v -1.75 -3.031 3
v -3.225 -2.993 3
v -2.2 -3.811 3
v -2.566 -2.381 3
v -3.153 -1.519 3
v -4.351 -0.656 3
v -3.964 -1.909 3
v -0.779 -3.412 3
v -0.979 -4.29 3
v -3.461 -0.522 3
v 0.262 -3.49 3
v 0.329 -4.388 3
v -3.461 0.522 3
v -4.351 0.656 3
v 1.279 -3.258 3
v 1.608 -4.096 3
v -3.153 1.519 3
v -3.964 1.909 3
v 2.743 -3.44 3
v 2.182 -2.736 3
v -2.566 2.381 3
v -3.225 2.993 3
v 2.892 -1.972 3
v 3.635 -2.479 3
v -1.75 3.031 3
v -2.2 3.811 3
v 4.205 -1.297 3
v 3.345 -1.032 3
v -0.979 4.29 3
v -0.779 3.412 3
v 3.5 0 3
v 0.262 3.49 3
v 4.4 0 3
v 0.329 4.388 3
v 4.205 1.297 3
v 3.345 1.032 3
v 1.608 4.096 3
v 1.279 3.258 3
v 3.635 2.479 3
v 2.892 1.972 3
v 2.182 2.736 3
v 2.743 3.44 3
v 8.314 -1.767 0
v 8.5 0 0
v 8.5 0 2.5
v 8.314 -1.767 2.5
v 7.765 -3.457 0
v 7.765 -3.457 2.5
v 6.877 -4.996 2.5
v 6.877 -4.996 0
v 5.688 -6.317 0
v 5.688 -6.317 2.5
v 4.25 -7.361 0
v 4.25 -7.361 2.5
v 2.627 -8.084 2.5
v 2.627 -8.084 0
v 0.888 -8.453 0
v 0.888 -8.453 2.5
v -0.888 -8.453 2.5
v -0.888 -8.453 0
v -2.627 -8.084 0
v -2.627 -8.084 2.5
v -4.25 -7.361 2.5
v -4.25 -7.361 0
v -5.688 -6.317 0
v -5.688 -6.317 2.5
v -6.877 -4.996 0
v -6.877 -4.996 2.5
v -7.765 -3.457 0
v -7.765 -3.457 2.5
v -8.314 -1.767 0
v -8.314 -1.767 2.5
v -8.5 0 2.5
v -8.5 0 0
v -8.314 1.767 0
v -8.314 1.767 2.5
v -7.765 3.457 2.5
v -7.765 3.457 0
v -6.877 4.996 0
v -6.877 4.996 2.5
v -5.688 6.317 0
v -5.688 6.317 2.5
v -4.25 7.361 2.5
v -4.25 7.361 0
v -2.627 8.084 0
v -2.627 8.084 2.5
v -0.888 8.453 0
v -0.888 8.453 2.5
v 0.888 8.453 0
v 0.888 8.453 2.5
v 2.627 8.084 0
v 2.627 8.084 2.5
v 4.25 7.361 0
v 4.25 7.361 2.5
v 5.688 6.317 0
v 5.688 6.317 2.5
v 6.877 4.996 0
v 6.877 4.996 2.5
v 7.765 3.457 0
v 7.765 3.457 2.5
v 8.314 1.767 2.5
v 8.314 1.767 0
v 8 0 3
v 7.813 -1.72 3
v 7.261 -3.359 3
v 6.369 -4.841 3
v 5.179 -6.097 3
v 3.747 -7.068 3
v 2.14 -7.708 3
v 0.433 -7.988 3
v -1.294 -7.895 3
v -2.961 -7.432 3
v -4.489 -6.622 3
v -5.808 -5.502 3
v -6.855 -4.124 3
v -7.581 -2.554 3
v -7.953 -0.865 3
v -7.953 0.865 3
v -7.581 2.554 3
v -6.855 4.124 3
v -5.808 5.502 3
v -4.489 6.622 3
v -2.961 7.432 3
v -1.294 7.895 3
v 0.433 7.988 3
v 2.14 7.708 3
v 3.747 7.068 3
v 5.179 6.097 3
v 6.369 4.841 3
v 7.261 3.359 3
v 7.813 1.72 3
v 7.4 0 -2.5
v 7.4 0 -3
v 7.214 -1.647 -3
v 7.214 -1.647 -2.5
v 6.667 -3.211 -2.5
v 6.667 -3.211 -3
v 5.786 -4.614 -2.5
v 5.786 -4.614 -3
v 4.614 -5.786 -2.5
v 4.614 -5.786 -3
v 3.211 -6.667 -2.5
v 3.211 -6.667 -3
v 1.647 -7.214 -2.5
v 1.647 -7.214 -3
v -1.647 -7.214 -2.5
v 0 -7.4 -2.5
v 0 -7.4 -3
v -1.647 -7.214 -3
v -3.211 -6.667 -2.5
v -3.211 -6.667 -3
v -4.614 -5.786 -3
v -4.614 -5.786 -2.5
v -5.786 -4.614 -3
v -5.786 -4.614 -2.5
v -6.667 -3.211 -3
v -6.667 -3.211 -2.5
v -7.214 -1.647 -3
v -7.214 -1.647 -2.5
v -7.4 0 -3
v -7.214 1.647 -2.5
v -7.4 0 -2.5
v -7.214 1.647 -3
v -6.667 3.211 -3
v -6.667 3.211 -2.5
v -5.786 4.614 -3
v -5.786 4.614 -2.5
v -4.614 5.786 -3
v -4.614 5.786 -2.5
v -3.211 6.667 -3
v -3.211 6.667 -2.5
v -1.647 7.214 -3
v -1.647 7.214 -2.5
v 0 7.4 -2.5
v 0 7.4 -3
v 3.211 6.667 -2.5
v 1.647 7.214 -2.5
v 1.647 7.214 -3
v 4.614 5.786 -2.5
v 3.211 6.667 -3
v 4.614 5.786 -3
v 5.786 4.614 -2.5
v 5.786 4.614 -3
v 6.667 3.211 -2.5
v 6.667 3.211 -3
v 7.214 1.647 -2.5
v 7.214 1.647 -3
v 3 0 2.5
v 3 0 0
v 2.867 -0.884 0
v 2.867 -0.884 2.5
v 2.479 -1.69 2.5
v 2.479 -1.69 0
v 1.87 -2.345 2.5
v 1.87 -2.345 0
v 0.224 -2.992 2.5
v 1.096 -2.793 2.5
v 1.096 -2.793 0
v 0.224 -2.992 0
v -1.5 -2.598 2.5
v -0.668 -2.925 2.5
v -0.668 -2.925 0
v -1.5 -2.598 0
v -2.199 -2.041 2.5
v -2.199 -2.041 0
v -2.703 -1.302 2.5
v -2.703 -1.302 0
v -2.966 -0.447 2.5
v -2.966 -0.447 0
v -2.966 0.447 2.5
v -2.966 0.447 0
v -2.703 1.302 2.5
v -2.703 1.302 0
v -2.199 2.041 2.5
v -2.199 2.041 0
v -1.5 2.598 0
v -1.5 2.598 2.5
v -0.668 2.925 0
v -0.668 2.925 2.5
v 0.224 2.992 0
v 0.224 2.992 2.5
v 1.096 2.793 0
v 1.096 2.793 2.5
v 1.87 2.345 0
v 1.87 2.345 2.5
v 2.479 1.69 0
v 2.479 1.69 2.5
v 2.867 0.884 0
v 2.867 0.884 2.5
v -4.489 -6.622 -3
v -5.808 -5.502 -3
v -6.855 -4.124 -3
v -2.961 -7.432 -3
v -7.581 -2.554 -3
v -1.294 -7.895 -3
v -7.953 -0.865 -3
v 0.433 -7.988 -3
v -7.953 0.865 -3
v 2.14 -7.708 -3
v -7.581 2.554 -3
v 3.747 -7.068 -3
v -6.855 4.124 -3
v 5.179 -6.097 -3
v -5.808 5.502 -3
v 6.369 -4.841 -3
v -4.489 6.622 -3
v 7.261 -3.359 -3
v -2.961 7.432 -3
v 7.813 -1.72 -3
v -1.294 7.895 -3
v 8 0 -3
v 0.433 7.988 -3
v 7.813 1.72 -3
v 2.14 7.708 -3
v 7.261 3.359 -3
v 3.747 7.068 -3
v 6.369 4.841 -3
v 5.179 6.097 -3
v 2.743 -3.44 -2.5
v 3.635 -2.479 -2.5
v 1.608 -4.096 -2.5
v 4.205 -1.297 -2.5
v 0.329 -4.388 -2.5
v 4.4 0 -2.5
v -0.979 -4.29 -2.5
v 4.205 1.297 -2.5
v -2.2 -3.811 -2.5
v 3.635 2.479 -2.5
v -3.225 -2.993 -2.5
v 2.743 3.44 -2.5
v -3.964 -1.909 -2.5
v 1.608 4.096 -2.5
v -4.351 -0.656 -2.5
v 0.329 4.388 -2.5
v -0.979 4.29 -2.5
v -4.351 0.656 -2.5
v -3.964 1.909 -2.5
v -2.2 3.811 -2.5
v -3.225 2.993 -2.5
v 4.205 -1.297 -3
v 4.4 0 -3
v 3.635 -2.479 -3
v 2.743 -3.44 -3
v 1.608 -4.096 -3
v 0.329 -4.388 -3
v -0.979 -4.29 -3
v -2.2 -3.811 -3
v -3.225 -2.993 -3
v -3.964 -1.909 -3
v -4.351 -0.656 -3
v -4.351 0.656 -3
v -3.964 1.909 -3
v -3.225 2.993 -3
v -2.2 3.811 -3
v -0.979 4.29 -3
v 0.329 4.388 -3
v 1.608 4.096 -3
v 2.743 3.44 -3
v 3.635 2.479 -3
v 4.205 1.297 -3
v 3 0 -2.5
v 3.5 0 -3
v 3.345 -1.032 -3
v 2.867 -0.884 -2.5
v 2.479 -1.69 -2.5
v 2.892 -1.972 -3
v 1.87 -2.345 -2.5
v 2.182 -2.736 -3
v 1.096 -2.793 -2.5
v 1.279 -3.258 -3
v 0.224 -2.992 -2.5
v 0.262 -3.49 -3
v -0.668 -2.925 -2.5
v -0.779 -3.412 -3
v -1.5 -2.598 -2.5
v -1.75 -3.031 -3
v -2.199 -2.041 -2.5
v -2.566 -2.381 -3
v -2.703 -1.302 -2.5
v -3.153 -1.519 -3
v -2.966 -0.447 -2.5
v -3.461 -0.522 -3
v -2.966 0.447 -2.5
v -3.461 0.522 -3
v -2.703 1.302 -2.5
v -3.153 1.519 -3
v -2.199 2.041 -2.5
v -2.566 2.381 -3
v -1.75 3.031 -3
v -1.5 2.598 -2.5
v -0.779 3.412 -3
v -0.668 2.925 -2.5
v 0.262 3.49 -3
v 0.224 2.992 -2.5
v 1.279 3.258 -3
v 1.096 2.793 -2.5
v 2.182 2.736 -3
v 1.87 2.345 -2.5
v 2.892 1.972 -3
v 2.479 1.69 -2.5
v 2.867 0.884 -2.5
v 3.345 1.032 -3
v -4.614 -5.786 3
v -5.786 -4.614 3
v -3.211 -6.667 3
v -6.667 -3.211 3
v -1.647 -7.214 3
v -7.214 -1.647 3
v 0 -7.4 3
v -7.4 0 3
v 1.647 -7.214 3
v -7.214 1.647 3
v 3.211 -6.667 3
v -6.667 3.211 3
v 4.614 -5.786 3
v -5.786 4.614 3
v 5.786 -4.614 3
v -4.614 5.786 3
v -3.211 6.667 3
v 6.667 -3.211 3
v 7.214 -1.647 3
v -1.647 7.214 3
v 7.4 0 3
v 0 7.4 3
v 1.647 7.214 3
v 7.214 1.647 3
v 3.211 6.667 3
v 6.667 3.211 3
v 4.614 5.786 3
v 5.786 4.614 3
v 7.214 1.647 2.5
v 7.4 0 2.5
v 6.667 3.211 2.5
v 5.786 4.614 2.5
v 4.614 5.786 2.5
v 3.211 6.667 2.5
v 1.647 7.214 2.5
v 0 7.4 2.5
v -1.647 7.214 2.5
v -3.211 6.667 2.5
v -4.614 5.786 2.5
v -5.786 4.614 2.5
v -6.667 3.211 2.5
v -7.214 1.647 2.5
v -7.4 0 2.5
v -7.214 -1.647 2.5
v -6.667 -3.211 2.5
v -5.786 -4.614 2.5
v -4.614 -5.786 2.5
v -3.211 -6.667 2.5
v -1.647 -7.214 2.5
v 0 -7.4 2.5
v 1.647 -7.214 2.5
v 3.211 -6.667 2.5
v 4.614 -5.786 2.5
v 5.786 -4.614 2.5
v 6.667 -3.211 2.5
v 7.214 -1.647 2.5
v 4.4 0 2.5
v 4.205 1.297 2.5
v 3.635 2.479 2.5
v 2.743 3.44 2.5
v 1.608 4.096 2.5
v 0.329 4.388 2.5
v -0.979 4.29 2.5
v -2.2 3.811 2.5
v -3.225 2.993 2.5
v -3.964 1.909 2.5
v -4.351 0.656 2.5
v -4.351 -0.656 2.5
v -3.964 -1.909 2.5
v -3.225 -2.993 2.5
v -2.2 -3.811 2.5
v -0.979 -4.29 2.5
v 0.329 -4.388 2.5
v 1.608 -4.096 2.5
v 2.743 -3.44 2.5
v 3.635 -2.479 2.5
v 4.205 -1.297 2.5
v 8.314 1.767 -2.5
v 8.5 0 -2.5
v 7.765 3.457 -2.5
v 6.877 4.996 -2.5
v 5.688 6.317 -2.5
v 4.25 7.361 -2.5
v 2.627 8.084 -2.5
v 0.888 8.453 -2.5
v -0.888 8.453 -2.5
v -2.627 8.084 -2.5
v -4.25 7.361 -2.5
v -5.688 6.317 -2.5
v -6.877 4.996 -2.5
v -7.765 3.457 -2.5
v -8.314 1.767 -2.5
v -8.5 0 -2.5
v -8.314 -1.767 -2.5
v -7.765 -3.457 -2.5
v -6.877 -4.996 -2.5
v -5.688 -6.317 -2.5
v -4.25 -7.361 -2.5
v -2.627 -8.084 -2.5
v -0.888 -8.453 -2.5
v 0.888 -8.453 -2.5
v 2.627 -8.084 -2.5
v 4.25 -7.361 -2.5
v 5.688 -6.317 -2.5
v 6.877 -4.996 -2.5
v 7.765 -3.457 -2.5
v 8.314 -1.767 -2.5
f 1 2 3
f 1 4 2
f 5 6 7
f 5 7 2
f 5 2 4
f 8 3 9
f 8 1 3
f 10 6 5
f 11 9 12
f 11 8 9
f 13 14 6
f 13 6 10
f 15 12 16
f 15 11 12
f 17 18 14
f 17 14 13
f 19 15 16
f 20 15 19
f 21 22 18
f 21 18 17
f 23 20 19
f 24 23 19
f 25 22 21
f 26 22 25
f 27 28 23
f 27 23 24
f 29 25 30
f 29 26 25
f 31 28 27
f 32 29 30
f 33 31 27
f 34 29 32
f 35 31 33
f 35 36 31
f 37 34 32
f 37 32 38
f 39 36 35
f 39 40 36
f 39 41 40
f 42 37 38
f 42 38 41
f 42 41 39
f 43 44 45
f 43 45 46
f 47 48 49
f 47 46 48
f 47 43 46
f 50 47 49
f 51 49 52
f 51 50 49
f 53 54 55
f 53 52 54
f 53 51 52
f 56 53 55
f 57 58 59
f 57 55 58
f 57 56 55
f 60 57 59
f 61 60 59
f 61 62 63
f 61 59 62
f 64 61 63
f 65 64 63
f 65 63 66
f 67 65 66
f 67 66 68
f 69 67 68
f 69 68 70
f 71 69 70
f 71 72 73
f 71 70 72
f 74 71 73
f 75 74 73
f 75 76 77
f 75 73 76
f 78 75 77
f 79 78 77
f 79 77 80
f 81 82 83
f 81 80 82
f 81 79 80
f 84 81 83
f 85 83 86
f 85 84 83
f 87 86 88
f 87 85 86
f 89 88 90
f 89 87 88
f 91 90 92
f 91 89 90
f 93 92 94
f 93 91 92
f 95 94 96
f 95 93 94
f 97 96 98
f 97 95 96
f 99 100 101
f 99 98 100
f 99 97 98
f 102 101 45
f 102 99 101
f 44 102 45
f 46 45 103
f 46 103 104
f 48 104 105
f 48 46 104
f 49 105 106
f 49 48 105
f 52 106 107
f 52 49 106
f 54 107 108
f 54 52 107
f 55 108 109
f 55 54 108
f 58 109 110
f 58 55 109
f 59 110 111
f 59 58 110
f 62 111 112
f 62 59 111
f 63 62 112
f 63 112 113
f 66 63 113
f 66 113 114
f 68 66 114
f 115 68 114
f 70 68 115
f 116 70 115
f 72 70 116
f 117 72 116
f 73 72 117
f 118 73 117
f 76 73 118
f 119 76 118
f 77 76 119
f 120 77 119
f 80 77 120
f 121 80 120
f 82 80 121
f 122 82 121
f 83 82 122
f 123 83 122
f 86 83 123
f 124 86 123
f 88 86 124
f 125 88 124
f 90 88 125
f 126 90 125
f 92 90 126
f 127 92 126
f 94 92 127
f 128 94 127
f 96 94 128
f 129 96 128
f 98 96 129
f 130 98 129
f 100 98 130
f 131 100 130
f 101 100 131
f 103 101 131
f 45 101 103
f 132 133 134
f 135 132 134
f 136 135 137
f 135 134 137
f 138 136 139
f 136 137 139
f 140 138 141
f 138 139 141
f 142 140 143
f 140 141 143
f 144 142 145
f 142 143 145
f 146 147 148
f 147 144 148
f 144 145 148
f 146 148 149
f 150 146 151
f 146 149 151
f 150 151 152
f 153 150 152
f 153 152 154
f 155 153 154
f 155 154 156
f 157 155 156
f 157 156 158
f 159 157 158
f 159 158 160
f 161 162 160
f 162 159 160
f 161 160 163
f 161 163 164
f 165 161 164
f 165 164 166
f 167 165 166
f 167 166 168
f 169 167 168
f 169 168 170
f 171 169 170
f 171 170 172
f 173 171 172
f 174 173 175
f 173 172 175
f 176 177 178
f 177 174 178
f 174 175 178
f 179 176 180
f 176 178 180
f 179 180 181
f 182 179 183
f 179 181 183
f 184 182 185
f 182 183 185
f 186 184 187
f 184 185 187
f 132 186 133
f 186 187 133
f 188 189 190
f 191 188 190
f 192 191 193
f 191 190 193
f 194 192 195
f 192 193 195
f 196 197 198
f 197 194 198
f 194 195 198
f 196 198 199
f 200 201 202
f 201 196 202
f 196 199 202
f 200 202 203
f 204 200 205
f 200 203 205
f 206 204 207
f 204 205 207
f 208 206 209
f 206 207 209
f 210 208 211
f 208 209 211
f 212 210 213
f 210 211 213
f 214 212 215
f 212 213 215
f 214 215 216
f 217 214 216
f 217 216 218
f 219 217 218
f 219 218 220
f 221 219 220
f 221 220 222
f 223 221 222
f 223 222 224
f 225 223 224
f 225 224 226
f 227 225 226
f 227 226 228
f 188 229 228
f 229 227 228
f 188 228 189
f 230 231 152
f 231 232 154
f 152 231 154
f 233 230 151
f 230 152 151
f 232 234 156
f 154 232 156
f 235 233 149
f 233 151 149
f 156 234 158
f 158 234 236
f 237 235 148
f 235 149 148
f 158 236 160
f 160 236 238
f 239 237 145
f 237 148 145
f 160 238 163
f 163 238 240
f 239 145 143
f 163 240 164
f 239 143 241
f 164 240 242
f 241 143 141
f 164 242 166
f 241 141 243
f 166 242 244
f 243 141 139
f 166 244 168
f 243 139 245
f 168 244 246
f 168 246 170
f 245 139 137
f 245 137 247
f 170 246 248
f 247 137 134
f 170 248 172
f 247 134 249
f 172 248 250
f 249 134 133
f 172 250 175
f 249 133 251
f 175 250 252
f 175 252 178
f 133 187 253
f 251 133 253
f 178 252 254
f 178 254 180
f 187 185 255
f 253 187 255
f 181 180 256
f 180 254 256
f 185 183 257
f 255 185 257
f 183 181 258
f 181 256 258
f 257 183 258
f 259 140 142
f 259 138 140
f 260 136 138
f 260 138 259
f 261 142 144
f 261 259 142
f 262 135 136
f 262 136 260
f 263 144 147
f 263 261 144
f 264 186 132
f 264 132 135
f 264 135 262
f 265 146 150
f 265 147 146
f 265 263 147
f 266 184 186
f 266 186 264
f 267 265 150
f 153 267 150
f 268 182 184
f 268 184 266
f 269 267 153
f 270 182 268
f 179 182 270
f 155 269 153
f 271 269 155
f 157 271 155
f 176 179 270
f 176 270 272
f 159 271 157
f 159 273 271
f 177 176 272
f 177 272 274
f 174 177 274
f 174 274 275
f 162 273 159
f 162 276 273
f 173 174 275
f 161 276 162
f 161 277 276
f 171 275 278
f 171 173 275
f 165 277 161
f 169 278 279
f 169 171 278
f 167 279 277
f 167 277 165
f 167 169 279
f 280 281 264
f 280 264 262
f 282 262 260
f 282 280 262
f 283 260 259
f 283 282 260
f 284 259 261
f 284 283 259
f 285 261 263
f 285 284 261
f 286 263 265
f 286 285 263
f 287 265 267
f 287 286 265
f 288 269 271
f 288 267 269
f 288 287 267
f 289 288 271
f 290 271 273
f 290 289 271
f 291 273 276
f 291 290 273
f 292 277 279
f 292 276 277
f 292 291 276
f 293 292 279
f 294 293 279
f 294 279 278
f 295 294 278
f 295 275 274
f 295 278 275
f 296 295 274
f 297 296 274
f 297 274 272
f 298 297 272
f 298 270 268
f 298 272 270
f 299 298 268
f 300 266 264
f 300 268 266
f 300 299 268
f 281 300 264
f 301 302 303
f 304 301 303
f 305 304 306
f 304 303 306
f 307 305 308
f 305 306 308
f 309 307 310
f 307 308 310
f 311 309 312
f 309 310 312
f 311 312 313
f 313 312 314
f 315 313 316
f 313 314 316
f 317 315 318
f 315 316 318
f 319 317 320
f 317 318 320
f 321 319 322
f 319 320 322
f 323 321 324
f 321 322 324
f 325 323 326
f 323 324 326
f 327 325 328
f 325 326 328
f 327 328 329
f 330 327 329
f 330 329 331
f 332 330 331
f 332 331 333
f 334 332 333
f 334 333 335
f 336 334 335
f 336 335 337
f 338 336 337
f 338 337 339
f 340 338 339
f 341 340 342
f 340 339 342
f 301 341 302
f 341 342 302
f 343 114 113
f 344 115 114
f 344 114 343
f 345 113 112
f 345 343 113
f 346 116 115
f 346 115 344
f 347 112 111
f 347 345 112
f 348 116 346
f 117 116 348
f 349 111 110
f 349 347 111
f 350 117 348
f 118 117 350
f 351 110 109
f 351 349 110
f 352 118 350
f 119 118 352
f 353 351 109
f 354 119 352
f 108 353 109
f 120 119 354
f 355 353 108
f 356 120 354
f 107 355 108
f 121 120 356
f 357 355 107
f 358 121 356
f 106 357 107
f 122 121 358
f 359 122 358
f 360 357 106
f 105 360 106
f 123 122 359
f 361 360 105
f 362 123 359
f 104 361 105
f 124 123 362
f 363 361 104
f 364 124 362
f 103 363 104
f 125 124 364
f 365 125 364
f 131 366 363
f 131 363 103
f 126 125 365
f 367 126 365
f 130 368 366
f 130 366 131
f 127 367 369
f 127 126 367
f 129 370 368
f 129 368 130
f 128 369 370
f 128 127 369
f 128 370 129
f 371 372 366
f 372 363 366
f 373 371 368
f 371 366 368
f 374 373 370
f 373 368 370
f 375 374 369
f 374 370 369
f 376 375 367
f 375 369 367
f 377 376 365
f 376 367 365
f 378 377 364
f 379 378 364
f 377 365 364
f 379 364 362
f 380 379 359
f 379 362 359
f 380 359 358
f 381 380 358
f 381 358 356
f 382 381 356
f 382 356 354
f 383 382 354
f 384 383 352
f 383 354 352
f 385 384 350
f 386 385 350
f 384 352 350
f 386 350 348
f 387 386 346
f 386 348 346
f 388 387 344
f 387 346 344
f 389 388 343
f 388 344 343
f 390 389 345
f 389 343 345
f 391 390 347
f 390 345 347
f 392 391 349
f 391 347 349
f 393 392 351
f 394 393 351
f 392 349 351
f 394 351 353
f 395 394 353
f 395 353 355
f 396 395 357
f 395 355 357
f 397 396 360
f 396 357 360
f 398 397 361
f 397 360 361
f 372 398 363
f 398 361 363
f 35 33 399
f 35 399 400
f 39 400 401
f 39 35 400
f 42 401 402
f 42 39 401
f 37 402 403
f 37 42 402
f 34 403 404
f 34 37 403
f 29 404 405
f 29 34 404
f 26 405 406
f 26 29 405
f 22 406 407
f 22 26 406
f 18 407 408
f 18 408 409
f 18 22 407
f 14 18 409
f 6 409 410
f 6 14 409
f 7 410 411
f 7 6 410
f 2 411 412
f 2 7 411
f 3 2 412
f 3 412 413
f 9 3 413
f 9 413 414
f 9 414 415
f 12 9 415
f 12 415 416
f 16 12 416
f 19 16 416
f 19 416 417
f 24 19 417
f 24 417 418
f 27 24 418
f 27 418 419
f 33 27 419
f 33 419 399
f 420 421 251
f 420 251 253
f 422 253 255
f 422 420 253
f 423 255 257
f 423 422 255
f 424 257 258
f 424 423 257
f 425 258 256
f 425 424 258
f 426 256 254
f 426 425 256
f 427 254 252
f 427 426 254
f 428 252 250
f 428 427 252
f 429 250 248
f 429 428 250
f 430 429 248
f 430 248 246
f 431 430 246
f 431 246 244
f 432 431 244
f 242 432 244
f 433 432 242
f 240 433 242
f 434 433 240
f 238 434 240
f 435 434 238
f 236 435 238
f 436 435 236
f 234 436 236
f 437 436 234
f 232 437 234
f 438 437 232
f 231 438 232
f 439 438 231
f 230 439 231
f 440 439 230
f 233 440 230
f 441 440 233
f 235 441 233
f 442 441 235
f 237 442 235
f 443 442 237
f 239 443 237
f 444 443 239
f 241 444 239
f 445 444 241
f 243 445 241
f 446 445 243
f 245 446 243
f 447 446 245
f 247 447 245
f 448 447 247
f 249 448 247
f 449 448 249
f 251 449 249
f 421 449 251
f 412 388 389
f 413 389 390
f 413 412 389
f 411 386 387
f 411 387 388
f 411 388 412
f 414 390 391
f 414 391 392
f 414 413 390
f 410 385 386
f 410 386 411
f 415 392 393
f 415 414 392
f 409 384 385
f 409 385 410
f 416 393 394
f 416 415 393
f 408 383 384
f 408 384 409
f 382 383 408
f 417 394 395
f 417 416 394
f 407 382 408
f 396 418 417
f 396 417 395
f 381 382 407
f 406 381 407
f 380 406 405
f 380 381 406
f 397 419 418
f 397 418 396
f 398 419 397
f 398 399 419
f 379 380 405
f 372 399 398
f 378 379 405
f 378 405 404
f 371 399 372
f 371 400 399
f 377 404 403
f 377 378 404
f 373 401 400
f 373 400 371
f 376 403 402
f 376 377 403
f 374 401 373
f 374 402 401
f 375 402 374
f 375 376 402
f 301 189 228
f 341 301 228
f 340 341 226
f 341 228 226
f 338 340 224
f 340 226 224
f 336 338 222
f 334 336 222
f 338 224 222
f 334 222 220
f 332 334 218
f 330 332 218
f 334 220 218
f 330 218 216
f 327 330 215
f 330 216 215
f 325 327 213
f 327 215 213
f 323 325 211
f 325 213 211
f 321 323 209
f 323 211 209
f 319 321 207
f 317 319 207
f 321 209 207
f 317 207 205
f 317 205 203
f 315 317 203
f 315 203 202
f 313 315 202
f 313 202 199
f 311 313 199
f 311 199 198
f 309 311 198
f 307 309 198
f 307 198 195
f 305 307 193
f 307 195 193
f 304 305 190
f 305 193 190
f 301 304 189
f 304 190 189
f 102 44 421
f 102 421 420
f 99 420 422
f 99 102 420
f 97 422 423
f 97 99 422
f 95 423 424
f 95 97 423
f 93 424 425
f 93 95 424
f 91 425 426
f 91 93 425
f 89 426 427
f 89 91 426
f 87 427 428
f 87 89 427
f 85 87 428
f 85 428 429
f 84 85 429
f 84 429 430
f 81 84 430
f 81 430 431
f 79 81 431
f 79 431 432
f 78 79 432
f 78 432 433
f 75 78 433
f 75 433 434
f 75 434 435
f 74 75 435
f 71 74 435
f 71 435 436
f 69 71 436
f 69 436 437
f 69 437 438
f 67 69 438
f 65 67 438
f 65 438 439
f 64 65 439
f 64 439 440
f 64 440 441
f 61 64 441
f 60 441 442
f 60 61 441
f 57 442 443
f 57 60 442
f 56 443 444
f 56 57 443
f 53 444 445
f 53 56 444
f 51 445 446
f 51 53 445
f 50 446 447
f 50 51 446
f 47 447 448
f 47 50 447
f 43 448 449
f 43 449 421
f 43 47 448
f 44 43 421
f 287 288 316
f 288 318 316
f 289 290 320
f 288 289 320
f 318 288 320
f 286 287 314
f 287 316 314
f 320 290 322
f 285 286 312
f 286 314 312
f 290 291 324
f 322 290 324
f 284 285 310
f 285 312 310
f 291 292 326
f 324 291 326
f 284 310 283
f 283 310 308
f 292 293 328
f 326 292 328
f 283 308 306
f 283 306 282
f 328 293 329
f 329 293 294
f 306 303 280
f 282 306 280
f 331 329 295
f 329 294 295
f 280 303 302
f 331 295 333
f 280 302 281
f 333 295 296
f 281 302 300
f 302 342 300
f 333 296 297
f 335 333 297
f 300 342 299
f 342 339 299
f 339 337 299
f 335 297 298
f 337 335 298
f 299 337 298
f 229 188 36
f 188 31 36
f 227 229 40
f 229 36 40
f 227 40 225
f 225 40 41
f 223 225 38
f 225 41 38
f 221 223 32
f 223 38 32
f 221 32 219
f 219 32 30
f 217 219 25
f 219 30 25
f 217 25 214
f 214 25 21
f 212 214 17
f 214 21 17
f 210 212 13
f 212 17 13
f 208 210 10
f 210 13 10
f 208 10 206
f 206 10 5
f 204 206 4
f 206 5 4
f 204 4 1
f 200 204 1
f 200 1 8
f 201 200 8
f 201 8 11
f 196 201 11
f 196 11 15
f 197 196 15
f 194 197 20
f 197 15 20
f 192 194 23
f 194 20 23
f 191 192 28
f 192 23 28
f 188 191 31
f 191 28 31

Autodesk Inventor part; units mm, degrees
ref_plane "YZ Plane" through (0, 0, 0) normal (1, 0, 0) x (0, 1, 0)
ref_plane "XZ Plane" through (0, 0, 0) normal (0, 1, 0) x (-1, 0, 0)
ref_plane "XY Plane" through (0, 0, 0) normal (0, 0, 1) x (1, 0, 0)
sketch "Эскиз1" plane through (0, 0, 0) normal (0, 0, 1) x (1, 0, 0)
  circle A0 centre (0, 0) radius 8.5
  circle A1 centre (0, 0) radius 3
  dimension "d0" = 6
  dimension "d1" = 17
extrude "Выдавливание1" add sketch "Эскиз1" along normal mid plane 6
chamfer "Фаска1" distance 0.5 angle 45 4 edges at (-8.5, 0, -3) (-8.5, 0, 3) (-3, 0, 3) (-3, 0, -3)
sketch "Эскиз2" plane through (0, 0, 3) normal (0, 0, 1) x (1, 0, 0)
  circle A0 centre (0, 0) radius 7.4
  circle A1 centre (0, 0) radius 4.4
  dimension "d7" = 8.8
  dimension "d8" = 14.8
extrude "Выдавливание2" cut sketch "Эскиз2" against normal blind 0.5
mirror "Зеркальное отражение1" about plane through (0, 0, 0) normal (0, 0, 1) of "Выдавливание2"
properties part number "Подшипник"
